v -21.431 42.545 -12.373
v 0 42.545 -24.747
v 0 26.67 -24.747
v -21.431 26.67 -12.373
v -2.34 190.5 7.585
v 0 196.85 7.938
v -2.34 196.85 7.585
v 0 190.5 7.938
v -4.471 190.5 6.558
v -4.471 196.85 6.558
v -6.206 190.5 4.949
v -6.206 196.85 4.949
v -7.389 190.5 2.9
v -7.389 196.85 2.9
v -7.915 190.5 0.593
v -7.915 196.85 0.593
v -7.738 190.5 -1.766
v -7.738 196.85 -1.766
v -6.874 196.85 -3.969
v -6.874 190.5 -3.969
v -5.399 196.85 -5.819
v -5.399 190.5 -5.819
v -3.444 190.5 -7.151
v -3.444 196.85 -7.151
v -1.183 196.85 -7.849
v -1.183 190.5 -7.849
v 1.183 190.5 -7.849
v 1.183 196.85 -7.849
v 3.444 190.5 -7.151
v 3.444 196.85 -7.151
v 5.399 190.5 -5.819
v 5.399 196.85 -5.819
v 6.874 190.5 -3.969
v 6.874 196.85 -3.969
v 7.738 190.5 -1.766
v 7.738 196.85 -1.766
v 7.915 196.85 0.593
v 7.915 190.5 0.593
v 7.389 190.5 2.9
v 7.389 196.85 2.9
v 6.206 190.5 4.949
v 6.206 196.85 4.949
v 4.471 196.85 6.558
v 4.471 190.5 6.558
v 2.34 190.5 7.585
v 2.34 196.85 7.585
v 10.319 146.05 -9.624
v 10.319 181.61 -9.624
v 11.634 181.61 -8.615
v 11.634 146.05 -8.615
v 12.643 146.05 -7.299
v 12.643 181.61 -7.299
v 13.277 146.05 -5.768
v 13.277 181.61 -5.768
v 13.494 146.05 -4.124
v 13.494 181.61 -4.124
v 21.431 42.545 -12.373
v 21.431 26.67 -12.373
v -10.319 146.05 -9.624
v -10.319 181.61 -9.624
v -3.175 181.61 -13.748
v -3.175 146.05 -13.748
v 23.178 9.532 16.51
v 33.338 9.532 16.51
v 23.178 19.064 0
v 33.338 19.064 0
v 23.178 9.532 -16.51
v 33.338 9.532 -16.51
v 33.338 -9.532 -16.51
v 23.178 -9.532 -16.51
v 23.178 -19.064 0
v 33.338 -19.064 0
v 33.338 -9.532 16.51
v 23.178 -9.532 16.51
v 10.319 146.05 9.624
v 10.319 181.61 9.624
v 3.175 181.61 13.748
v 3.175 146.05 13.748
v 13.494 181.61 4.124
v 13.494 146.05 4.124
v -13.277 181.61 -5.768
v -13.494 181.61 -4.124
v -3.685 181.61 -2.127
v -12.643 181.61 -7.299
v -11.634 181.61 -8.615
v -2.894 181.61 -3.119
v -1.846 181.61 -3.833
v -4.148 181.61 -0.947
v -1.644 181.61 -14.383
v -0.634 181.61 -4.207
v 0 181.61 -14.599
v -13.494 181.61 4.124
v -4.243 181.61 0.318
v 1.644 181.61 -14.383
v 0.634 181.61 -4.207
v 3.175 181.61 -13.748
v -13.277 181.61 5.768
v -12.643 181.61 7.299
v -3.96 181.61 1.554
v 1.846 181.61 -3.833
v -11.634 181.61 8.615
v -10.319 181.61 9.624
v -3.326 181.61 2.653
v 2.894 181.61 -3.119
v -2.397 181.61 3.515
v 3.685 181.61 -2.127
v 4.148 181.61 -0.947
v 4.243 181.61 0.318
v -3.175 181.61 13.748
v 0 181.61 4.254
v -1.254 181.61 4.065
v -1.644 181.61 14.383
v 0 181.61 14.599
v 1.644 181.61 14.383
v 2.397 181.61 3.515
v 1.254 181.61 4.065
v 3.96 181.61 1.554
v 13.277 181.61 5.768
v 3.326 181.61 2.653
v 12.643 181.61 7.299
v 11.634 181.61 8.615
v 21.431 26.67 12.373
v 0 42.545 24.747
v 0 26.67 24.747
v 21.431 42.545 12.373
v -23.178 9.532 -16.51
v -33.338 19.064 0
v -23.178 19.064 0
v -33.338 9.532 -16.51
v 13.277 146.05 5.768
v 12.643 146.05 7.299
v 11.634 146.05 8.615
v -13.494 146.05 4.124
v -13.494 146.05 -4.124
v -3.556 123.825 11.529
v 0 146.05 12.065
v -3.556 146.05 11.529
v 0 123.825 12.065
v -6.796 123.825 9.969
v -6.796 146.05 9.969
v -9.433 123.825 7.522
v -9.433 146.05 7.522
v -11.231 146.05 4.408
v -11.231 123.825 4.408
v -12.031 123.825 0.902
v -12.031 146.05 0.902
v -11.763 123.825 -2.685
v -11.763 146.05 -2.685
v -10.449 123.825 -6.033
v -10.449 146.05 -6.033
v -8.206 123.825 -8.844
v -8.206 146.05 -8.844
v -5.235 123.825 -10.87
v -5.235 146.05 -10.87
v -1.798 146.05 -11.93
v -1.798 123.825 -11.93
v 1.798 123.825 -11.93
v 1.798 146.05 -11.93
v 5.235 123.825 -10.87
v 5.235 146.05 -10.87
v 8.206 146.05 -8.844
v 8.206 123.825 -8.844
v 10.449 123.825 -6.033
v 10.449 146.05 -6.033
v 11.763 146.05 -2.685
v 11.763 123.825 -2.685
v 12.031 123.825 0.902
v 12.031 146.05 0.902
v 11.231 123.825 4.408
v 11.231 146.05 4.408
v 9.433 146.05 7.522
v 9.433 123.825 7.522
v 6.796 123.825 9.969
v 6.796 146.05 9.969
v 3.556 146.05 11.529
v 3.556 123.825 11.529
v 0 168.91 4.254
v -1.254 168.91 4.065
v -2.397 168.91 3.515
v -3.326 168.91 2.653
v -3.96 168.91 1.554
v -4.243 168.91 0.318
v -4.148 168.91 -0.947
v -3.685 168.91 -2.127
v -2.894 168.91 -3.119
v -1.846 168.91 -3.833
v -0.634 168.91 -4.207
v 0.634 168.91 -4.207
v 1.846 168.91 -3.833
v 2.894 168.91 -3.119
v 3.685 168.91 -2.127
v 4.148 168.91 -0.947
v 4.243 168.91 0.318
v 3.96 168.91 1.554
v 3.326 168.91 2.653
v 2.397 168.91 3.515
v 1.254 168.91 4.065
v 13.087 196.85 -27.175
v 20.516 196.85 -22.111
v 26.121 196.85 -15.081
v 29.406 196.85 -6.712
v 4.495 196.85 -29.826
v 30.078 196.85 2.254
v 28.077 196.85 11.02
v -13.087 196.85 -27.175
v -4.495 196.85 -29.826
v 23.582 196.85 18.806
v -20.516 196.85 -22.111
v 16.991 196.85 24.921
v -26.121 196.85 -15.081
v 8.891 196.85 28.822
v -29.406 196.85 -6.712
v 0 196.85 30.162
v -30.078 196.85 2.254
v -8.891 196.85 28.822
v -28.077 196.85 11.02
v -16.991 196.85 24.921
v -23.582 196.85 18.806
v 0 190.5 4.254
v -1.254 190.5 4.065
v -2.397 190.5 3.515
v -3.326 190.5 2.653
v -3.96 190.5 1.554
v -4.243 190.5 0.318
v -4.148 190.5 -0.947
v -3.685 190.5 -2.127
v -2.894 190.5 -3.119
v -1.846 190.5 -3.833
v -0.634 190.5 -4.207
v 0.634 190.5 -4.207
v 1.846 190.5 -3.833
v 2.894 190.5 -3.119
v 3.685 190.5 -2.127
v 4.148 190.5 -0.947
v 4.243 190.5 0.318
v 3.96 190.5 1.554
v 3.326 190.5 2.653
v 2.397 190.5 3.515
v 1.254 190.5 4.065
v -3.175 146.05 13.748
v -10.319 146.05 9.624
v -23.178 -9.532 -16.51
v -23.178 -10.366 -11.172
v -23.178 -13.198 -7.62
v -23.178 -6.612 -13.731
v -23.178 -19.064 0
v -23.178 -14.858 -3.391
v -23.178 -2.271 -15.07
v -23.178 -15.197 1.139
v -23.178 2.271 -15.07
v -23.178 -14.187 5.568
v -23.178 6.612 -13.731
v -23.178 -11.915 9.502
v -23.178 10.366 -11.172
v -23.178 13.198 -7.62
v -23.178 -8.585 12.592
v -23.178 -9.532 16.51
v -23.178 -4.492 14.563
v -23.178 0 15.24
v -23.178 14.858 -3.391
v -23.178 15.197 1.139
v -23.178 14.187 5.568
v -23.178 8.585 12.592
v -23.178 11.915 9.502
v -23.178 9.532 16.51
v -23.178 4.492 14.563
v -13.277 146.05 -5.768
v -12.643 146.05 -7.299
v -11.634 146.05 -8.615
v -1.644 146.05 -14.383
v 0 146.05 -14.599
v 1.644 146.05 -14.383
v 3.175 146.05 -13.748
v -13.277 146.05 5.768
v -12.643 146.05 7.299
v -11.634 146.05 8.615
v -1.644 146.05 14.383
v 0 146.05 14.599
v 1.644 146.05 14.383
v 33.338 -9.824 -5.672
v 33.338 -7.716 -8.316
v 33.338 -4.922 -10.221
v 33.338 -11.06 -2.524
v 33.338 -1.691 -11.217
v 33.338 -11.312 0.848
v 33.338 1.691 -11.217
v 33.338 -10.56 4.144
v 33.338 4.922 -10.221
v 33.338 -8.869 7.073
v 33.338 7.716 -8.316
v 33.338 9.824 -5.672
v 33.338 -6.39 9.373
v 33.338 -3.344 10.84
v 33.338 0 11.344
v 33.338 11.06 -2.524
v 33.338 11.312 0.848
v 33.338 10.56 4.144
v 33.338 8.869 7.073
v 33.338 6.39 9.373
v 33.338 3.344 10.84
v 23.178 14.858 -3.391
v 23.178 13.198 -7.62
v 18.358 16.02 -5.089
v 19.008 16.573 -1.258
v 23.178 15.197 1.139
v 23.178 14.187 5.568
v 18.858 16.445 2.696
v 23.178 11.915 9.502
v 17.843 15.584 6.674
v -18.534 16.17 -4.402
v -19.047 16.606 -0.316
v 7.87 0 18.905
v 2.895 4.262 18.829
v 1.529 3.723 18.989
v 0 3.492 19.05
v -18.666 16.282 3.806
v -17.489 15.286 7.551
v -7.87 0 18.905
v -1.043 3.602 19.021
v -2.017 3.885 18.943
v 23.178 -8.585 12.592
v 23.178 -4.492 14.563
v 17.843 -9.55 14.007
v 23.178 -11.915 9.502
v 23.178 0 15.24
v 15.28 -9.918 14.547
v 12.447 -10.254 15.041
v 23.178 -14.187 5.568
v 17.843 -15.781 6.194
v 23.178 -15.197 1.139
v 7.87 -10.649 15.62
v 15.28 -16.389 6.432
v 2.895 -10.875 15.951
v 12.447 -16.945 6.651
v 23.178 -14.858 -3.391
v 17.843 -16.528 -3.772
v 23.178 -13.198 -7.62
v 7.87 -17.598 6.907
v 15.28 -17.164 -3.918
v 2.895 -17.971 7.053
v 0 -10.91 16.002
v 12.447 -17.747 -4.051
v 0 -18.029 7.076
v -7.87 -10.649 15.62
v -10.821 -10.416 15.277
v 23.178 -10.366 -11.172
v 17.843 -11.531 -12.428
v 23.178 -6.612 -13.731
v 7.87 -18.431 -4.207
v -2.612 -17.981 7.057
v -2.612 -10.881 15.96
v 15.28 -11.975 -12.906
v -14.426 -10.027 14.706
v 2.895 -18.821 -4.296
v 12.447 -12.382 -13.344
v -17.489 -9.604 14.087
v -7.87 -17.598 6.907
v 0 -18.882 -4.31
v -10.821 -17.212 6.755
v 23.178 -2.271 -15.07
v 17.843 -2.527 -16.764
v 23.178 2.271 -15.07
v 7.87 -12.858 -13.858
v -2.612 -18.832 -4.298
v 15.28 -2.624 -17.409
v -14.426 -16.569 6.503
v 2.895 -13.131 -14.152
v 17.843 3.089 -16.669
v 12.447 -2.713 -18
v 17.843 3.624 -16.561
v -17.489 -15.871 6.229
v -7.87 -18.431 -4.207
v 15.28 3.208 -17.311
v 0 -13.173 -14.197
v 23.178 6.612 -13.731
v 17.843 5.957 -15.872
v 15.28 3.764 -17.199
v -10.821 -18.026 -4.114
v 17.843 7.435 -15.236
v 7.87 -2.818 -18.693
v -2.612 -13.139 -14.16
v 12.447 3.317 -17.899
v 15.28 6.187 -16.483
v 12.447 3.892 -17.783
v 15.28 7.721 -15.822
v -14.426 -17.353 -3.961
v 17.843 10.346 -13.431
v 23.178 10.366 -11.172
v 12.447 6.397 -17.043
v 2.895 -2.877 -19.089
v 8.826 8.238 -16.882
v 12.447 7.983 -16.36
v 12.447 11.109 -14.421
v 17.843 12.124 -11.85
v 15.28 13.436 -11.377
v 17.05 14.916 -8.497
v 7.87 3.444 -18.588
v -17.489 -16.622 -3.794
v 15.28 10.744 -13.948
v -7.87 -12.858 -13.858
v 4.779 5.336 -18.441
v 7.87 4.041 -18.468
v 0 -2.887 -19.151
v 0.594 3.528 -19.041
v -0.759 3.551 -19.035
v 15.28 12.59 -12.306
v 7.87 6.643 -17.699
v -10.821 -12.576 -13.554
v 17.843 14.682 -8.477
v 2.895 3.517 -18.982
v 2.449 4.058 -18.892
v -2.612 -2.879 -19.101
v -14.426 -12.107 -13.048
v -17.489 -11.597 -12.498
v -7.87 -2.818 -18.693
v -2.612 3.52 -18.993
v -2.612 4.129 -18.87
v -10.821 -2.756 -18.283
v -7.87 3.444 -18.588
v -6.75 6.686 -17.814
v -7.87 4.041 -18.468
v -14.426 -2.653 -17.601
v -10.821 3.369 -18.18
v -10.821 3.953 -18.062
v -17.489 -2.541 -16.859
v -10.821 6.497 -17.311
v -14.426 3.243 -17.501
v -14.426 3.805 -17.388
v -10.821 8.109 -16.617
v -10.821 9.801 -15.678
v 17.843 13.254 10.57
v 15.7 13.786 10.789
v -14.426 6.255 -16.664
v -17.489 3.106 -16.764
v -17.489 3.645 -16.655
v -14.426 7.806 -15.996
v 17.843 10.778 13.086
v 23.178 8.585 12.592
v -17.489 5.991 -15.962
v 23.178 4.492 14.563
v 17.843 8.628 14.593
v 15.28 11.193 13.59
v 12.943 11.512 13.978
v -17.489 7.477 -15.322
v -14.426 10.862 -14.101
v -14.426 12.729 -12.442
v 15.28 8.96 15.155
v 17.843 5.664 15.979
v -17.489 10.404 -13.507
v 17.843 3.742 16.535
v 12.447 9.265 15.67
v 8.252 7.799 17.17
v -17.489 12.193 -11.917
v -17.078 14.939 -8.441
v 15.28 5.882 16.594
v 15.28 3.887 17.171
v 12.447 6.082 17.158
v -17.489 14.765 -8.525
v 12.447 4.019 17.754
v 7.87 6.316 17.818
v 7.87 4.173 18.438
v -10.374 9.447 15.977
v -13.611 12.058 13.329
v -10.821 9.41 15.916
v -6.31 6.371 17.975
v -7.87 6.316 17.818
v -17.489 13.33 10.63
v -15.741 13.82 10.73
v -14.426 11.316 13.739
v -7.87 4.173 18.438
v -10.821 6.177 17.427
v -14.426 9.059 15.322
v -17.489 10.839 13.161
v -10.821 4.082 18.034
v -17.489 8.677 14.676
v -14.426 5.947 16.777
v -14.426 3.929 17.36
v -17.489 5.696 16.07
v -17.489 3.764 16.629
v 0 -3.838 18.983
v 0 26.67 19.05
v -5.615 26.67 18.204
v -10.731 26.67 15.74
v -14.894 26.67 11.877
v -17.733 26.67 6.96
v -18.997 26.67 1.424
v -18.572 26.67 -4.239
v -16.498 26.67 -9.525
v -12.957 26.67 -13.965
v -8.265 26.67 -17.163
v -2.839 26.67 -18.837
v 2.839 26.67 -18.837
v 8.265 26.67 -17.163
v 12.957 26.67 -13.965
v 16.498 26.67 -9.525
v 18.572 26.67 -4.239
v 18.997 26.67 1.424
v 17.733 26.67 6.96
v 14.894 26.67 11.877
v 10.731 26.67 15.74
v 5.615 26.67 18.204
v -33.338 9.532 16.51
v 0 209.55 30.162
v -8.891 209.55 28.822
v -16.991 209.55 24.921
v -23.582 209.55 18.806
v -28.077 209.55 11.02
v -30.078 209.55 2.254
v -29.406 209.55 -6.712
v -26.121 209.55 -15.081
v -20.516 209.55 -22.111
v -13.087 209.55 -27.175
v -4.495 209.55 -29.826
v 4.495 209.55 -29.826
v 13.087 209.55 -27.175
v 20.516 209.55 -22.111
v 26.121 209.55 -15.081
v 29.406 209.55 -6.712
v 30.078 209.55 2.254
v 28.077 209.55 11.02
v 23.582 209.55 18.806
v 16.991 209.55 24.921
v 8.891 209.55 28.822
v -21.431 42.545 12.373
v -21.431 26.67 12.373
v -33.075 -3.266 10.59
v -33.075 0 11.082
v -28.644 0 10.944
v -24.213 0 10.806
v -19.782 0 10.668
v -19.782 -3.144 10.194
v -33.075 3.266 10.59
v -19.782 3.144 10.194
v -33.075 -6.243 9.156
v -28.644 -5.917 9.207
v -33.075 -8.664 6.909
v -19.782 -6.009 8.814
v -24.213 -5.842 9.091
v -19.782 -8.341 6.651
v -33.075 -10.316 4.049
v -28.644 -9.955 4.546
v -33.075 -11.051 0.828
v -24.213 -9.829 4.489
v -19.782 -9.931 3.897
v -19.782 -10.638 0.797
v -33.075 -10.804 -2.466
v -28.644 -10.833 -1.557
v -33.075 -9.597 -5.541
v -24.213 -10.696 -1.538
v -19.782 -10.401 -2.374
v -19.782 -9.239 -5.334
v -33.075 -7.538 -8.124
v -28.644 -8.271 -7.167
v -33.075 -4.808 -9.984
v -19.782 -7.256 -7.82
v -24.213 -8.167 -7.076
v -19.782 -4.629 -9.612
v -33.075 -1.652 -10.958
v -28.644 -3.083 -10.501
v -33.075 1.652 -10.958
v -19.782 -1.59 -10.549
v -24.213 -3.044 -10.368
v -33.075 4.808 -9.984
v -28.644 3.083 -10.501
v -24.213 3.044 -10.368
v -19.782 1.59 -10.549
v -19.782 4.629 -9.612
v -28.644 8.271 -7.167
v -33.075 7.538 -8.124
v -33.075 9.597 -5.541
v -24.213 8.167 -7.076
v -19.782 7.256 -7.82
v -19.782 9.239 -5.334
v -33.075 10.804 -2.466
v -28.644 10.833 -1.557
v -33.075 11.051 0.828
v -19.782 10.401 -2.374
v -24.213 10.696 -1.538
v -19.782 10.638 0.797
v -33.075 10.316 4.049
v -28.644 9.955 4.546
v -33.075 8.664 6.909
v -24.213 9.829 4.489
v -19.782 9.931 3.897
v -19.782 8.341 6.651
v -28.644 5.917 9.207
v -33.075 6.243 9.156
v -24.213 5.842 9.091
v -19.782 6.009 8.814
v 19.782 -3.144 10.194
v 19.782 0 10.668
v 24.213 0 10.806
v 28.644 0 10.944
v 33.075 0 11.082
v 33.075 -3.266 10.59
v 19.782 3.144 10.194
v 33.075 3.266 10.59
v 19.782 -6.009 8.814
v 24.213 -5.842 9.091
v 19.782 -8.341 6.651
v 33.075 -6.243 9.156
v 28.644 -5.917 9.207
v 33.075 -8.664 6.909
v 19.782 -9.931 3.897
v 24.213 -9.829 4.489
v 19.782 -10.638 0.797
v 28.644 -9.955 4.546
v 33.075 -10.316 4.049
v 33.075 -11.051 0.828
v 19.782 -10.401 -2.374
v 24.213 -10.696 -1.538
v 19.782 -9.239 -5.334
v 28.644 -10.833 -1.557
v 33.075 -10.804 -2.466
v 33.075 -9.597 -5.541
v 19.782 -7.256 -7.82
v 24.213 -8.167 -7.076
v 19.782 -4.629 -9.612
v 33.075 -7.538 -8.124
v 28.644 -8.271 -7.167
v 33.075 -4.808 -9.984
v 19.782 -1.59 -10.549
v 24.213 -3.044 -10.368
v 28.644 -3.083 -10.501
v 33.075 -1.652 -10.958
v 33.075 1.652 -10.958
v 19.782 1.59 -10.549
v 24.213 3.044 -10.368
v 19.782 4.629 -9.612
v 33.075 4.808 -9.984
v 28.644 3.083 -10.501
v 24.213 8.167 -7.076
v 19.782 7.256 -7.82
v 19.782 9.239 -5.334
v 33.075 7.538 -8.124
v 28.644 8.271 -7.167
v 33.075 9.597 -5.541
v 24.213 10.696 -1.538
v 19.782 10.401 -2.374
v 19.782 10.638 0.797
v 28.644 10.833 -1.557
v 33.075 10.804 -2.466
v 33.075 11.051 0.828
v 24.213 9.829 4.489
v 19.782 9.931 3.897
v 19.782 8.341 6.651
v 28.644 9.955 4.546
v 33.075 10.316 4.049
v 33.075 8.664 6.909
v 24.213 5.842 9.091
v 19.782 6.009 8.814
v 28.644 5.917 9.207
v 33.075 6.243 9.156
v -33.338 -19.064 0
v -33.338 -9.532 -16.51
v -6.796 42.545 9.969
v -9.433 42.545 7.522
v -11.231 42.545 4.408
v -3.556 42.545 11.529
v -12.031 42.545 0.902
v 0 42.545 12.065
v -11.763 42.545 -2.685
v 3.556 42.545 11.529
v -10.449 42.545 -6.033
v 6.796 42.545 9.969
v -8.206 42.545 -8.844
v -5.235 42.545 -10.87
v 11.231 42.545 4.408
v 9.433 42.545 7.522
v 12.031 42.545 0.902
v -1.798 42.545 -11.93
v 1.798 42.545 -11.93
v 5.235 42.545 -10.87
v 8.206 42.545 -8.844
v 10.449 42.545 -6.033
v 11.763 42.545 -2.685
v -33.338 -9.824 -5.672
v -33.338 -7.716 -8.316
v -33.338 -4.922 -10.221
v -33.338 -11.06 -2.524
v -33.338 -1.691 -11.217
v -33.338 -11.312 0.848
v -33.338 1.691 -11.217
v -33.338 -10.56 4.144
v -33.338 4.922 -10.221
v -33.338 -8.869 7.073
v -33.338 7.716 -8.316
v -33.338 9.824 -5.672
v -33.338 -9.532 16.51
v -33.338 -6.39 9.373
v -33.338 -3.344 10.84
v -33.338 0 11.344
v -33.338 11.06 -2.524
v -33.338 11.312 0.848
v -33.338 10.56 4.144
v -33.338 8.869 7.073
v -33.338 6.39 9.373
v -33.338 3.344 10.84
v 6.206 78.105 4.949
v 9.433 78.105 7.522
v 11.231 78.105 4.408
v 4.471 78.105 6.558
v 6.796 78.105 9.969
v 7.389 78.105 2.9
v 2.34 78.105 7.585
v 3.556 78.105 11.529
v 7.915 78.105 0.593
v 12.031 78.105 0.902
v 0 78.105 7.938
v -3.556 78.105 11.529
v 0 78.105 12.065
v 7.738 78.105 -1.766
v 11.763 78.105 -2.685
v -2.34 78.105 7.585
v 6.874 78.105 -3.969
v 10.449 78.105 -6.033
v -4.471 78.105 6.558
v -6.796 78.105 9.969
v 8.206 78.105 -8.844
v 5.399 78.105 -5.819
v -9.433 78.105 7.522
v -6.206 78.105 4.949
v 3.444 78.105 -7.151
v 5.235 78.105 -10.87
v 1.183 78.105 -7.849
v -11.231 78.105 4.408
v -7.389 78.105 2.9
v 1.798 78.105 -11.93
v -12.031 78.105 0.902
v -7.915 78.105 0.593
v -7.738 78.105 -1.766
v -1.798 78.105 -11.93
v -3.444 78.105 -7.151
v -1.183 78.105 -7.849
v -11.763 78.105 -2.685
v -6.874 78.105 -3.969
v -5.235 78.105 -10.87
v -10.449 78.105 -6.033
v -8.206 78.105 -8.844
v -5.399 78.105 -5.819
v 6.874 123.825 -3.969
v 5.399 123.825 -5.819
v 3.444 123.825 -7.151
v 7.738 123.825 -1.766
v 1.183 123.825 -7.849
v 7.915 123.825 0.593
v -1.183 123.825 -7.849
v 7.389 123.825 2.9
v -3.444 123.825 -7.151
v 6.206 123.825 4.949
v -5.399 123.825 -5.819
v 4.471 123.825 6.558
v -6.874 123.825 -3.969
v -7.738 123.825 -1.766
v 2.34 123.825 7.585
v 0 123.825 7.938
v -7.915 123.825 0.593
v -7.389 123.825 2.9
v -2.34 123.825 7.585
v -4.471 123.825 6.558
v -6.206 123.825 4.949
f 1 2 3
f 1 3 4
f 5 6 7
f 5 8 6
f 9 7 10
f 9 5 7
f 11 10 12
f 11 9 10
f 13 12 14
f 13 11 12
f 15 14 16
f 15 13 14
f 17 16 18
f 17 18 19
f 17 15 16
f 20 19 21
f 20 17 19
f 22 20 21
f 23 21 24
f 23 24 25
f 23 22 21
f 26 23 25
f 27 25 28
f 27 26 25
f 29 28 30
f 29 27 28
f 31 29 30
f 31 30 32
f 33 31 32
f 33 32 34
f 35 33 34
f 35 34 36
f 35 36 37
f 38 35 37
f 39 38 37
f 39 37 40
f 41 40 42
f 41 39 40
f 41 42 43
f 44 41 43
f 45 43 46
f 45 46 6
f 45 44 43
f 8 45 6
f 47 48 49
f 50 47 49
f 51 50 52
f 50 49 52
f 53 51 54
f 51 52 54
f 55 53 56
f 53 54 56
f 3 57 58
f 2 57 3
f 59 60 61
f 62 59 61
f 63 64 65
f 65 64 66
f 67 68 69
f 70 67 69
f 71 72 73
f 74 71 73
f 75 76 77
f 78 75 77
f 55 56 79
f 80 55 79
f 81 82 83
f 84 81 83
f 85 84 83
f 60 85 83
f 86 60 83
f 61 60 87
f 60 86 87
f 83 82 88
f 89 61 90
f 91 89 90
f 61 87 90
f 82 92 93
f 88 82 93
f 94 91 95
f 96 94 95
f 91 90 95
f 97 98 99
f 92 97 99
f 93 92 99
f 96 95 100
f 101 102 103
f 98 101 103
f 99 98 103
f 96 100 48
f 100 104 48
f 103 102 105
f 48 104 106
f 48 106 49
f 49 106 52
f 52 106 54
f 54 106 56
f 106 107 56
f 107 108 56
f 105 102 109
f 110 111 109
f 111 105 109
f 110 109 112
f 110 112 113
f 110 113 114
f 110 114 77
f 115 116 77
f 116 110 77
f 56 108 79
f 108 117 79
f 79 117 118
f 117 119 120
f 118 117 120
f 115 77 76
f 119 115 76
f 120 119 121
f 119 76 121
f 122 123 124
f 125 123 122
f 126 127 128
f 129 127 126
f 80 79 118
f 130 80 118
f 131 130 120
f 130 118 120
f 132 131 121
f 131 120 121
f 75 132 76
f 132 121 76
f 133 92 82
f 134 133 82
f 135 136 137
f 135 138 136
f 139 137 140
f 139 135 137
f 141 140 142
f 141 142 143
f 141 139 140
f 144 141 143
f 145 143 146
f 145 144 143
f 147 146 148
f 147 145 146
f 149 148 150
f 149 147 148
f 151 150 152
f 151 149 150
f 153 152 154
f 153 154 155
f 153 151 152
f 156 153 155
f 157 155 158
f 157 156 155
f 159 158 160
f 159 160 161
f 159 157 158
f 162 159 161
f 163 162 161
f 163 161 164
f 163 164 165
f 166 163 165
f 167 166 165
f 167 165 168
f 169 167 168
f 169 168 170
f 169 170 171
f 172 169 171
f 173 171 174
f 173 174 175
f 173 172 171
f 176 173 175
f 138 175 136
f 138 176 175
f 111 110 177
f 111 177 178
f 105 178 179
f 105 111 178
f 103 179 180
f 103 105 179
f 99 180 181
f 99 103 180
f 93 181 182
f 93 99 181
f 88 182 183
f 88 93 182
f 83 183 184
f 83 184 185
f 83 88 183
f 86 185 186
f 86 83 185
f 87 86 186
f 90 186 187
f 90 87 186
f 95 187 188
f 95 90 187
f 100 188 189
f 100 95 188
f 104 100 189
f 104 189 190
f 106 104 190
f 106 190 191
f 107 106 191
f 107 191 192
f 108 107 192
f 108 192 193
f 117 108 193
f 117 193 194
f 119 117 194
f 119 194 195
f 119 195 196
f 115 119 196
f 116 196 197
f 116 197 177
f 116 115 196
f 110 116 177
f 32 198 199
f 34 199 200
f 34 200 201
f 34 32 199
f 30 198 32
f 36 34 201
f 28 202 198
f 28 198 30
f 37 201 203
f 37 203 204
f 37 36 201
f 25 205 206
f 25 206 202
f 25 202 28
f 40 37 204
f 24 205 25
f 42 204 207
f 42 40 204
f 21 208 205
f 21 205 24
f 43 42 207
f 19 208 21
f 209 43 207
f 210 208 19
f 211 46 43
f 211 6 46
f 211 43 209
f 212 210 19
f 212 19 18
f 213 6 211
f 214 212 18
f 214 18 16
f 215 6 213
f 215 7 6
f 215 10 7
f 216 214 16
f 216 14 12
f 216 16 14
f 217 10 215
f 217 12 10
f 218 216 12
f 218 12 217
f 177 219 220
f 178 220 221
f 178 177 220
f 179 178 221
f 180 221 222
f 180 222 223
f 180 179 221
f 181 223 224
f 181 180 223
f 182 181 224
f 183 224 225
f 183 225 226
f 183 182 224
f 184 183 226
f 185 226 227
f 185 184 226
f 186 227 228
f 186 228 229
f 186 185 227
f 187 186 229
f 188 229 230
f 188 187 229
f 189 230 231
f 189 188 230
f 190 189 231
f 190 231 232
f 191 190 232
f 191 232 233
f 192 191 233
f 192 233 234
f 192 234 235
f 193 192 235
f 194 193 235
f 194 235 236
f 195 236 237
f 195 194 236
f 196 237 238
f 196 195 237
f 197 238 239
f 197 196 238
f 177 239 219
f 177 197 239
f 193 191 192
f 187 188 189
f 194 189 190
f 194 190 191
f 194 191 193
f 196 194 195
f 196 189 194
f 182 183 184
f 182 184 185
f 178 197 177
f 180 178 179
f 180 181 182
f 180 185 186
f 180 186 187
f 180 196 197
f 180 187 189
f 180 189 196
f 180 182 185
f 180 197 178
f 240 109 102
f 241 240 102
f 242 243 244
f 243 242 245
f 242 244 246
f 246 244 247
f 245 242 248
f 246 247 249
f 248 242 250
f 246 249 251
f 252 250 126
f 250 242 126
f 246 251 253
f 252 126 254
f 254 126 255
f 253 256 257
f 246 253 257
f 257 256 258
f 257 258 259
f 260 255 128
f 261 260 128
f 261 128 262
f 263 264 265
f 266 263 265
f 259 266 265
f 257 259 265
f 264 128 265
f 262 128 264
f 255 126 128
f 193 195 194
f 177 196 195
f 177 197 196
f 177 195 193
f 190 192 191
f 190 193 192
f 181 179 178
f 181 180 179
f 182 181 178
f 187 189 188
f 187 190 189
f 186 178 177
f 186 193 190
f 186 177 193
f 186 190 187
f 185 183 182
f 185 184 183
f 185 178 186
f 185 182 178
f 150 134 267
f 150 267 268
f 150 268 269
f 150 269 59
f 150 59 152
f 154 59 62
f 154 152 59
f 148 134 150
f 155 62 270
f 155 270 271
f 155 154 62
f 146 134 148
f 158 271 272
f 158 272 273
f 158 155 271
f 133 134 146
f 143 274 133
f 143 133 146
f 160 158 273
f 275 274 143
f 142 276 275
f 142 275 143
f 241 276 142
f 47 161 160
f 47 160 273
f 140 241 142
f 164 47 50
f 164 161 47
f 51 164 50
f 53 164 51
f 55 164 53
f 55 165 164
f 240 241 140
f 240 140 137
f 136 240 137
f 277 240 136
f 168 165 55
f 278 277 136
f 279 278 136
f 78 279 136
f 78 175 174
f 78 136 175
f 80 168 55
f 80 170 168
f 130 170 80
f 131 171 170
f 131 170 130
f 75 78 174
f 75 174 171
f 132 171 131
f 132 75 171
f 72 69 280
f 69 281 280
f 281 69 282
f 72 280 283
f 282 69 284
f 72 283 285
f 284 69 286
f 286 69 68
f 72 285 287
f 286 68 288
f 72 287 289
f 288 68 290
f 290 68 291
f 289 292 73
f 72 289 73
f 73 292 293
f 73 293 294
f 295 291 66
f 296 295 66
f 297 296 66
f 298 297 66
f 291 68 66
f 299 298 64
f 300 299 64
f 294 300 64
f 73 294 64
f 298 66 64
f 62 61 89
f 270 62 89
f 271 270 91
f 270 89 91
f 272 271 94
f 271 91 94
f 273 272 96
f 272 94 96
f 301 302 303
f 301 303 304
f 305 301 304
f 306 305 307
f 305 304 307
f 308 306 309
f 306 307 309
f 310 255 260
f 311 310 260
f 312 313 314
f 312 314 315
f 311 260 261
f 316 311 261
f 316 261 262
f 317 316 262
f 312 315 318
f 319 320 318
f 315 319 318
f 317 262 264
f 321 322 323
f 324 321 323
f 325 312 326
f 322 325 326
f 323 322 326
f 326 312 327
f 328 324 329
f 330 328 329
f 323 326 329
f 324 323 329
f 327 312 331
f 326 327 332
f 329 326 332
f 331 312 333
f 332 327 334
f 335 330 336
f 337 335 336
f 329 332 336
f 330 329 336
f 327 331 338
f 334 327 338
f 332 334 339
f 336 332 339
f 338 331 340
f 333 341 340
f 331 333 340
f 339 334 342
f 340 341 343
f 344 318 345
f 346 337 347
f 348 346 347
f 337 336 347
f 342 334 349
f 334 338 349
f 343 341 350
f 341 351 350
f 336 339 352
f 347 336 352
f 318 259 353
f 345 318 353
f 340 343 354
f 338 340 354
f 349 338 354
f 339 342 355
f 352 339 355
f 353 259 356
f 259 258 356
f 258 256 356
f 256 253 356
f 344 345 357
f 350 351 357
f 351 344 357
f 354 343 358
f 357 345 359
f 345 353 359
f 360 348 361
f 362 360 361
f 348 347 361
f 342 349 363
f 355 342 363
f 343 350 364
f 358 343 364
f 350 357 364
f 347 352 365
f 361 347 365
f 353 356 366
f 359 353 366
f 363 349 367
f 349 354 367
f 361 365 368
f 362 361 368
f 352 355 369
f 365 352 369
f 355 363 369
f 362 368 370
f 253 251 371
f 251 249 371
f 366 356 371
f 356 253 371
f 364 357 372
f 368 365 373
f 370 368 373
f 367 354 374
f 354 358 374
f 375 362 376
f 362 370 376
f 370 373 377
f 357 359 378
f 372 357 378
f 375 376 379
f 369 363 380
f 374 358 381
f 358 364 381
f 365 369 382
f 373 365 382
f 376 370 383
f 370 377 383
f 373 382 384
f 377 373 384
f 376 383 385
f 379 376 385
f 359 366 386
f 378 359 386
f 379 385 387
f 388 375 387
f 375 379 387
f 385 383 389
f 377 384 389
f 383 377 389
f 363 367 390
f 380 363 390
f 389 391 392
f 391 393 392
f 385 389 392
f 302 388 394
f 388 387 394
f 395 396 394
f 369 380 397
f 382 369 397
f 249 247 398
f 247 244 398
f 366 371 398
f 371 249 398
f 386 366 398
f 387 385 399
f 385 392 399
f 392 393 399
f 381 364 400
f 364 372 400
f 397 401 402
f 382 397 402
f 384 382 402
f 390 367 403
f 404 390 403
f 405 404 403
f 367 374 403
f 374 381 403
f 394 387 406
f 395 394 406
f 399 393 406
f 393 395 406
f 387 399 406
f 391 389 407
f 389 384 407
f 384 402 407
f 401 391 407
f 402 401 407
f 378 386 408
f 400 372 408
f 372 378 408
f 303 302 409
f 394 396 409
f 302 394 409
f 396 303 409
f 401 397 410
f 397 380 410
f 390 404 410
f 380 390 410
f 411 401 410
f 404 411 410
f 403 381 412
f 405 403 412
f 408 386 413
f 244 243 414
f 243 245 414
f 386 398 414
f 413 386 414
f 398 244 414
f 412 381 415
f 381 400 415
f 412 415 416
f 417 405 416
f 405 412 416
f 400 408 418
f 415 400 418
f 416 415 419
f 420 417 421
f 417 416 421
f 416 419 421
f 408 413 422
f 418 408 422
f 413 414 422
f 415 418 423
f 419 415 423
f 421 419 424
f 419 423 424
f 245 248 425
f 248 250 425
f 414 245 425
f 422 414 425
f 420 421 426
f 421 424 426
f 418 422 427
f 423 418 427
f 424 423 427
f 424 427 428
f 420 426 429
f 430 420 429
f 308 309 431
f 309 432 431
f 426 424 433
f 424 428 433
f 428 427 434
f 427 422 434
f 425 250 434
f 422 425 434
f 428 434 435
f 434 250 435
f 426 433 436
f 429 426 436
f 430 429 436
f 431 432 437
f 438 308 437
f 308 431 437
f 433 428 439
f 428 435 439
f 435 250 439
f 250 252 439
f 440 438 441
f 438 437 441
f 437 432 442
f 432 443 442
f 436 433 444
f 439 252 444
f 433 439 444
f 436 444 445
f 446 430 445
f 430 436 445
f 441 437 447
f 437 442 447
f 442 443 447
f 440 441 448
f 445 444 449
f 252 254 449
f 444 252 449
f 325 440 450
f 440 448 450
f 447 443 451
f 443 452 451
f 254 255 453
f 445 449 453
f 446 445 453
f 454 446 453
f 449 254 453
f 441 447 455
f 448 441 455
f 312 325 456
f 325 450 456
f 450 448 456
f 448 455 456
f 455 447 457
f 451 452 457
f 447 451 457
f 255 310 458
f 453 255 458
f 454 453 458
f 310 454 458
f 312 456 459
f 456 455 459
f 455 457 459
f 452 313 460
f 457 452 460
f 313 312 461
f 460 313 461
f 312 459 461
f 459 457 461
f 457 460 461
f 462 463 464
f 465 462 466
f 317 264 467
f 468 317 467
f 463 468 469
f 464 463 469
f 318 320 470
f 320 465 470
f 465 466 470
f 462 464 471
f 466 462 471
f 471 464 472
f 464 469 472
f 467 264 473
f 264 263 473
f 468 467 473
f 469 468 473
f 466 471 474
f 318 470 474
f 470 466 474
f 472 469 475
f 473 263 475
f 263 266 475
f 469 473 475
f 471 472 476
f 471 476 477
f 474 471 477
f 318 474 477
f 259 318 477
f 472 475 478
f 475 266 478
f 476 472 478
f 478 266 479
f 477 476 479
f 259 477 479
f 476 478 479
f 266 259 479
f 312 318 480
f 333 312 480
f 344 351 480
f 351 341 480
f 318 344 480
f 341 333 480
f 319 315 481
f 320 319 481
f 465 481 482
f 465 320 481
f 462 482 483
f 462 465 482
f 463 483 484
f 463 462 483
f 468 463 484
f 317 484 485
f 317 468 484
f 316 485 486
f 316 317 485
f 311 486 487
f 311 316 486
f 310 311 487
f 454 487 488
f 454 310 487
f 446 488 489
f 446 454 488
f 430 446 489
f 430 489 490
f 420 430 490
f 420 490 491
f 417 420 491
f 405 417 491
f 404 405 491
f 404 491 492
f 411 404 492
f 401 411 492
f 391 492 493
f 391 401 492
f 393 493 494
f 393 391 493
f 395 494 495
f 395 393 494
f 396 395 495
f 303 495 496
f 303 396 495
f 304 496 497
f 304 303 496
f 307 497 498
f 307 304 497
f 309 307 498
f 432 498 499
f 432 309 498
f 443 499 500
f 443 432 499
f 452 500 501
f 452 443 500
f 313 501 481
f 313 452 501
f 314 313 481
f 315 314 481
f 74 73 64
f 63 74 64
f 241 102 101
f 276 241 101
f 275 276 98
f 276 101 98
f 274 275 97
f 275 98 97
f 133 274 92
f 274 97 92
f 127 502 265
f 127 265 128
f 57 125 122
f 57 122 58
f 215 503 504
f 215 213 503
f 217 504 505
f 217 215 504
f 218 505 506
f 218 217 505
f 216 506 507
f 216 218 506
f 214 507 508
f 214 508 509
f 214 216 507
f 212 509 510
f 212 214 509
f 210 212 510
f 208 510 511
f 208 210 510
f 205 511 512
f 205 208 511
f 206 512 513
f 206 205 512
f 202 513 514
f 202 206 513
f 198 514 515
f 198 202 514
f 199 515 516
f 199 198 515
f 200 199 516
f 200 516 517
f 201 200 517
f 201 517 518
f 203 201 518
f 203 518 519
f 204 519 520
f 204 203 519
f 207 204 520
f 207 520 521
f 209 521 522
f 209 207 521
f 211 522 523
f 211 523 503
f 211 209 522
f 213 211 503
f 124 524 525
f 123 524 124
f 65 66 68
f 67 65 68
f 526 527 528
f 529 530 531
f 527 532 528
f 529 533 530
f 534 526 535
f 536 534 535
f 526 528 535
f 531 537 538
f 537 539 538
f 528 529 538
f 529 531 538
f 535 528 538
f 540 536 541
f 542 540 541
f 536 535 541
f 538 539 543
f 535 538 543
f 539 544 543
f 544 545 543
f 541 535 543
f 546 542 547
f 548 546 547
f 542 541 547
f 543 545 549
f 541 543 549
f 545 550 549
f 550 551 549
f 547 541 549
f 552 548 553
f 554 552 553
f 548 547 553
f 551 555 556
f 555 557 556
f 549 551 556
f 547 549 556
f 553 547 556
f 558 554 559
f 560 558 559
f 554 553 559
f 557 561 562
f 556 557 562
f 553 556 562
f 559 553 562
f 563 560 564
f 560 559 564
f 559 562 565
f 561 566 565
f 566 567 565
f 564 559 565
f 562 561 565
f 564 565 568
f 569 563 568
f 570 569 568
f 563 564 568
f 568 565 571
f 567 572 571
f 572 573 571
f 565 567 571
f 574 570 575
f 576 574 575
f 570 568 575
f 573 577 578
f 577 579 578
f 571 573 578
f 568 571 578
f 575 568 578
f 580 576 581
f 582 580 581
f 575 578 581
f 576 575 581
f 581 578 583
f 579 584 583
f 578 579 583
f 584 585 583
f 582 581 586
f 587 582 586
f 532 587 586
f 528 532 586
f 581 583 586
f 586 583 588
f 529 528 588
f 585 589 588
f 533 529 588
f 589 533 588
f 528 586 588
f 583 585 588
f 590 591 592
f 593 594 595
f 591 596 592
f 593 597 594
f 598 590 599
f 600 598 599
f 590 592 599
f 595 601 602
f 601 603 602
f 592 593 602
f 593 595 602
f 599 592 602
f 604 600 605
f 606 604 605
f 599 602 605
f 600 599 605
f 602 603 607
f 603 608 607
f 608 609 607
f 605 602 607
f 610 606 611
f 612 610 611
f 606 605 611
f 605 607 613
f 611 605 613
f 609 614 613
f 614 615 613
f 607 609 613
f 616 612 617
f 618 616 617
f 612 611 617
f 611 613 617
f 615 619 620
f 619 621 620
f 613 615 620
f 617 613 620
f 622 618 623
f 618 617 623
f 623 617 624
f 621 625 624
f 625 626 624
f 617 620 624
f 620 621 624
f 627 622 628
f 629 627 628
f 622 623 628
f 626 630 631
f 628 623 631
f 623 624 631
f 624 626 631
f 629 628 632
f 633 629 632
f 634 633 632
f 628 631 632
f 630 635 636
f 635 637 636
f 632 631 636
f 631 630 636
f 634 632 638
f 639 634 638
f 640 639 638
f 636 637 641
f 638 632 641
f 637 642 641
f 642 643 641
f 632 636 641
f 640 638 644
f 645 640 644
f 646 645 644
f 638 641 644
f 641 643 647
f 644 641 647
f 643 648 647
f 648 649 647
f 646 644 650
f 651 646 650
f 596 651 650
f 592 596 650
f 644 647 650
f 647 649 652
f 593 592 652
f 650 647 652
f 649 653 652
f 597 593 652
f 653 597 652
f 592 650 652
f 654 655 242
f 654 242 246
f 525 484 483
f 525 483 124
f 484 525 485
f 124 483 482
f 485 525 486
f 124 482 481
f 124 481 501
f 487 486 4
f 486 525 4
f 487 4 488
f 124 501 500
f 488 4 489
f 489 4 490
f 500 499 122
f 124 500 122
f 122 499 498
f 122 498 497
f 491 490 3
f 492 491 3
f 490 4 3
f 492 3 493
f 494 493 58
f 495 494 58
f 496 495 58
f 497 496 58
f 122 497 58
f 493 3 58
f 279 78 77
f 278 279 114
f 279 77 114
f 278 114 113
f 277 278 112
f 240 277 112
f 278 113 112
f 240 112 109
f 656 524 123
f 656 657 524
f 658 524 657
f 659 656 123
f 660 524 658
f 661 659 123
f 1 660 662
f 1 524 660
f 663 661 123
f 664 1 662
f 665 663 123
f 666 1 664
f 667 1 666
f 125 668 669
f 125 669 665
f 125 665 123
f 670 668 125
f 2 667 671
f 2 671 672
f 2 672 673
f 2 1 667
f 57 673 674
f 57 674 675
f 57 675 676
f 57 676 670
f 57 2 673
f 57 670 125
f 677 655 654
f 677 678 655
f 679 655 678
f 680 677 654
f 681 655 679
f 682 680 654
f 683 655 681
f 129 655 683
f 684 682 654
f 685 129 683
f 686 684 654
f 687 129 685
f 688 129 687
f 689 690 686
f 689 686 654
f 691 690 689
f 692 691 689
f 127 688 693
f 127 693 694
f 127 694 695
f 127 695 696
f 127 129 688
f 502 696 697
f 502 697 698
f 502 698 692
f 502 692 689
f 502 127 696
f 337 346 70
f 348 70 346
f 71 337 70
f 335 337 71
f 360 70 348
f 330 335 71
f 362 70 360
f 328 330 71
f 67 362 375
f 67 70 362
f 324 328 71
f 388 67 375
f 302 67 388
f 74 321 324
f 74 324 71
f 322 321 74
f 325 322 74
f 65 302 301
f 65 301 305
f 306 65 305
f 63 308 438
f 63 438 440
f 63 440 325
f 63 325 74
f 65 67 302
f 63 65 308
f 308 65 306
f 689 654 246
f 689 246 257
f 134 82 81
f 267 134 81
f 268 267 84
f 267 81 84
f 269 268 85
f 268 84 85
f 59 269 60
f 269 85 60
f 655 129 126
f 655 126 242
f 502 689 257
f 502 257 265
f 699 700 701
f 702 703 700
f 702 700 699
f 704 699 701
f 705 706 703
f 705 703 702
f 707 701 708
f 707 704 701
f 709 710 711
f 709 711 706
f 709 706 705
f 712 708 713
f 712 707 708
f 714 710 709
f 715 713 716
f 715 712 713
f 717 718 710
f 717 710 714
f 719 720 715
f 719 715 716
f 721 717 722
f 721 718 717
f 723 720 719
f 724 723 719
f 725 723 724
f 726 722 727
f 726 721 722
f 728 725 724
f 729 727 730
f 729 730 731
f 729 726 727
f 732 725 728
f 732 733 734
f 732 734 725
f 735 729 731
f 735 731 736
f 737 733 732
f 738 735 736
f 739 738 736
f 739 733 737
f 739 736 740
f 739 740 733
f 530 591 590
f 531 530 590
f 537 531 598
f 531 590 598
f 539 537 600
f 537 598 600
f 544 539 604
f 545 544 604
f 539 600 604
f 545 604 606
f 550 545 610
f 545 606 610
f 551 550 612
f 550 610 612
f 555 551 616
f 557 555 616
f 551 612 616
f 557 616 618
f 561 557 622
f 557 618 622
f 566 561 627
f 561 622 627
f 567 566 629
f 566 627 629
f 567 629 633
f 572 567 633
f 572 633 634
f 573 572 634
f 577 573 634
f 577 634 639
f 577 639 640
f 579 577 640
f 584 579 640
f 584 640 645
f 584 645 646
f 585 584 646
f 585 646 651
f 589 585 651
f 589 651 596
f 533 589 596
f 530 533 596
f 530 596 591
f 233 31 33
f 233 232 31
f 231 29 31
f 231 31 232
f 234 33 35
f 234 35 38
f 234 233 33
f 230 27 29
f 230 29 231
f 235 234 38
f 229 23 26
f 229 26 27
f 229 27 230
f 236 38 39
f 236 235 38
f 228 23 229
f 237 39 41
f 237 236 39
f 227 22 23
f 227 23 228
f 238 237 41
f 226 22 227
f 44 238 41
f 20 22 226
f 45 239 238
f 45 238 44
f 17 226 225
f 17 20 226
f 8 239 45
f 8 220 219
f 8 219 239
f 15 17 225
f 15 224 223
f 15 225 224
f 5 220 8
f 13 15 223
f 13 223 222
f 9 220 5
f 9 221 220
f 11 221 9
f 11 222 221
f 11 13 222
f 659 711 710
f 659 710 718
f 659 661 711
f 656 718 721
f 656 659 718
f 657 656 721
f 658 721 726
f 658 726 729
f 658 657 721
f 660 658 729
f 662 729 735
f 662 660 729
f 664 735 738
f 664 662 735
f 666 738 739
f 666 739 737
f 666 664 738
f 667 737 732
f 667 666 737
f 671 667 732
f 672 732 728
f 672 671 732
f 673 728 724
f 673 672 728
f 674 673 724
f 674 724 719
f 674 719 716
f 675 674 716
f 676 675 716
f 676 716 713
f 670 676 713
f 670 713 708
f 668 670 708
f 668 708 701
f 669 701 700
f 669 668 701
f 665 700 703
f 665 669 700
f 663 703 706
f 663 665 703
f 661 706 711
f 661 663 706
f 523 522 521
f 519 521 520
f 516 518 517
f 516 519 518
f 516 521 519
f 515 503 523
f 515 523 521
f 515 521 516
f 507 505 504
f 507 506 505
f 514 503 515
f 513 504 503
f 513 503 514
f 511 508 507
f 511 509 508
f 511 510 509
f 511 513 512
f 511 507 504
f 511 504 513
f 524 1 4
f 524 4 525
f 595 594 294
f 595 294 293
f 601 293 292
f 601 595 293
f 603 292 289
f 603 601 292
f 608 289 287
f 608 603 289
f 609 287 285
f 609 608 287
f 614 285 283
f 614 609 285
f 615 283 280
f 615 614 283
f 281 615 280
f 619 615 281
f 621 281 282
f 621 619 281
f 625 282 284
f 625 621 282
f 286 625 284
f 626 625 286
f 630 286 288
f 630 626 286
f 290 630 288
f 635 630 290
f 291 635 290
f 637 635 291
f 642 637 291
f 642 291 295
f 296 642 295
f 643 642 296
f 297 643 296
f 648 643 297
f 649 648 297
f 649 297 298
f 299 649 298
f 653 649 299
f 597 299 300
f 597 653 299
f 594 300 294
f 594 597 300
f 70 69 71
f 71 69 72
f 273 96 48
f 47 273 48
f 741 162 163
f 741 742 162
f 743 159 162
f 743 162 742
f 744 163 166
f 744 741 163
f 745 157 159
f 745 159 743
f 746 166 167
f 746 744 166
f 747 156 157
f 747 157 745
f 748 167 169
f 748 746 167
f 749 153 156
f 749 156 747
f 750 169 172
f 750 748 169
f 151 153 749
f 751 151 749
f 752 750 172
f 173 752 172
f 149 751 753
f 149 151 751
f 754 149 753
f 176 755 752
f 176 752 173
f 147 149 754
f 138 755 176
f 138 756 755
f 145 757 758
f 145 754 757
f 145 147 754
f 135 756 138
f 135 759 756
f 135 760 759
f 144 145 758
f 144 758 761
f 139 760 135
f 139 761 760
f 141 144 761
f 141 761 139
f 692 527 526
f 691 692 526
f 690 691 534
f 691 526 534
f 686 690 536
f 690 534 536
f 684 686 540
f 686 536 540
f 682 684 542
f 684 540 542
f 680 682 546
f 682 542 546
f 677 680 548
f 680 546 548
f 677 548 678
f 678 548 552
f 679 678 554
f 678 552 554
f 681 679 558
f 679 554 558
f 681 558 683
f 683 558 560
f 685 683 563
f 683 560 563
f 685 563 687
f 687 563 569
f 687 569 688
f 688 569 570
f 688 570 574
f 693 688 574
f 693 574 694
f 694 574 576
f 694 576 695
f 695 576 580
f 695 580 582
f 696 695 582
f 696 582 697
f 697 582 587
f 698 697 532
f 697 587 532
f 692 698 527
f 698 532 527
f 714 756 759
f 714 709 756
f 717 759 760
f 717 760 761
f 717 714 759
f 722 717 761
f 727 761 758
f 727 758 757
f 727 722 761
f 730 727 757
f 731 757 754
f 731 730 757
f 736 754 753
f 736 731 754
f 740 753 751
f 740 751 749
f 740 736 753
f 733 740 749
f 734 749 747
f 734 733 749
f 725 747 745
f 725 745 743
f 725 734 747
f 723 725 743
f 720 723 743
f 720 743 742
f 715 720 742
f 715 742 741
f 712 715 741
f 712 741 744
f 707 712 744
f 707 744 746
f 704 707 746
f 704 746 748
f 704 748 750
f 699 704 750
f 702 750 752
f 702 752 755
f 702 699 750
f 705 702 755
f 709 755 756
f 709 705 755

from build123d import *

# Parameters (mm, degrees)
CUT_EXTRUDE1_DEPTH      = 186.884048489
CUT_EXTRUDE1_DEPTH_BACK = 186.884048489
SKETCH3_R               = 10.668
SKETCH4_R               = 11.0900667
BOSS_EXTRUDE1_DEPTH     = 10.16
BOSS_EXTRUDE2_DEPTH     = 15.875
SKETCH9_R               = 4.2545
BOSS_EXTRUDE4_DEPTH     = 35.56


with BuildPart() as part:
    # Sketch1 → Revolve1 (revolve)
    with BuildSketch(Plane.XY, mode=Mode.PRIVATE) as revolve1_sk:
        with BuildLine():
            Line((-33.3375, 11.0900667), (-19.78152, 10.668))
            Line((-19.78152, 10.668), (19.78152, 10.668))
            Line((19.78152, 10.668), (33.3375, 11.0900667))
            Line((33.3375, 11.0900667), (33.3375, 16.51))
            Line((33.3375, 16.51), (23.1775, 16.51))
            Line((23.1775, 16.51), (23.1775, 15.24))
            ThreePointArc((23.1775, 15.24), (0, 19.3675), (-23.1775, 15.24))
            Line((-23.1775, 15.24), (-23.1775, 16.51))
            Line((-23.1775, 16.51), (-33.3375, 16.51))
            Line((-33.3375, 16.51), (-33.3375, 11.0900667))
        make_face()
    revolve(revolve1_sk.sketch.rotate(Axis((-33.3375, 0, 0), (1, 0, 0)), 90), axis=Axis((-33.3375, 0, 0), (1, 0, 0)))

    # Sketch2 → Revolve2 (revolve)
    with BuildSketch(Plane.XY, mode=Mode.PRIVATE) as revolve2_sk:
        Polygon((0, 0), (0, 168.91), (4.2545, 168.91), (4.2545, 181.61), (13.49375, 181.61), (13.49375, 146.05), (12.065, 146.05), (12.065, 123.825), (7.9375, 123.825), (7.9375, 78.105), (12.065, 78.105), (12.065, 42.545), (21.43125, 42.545), (21.43125, 26.67), (19.05, 26.67), (19.05, 0), align=None)
    revolve(revolve2_sk.sketch.rotate(Axis((0, 0, 0), (0, -1, 0)), 90), axis=Axis((0, 0, 0), (0, -1, 0)))

    # Sketch3 → Cut-Extrude1 (cut, two sides: drawn at the far end of the back side and taken through both)
    with BuildSketch(Plane(origin=(0, 0, 0), x_dir=(0, 0, -1), z_dir=(1, 0, 0)).offset(-CUT_EXTRUDE1_DEPTH_BACK)):
        with Locations(Location((0, 0, 0), (0, 0, 180))):
            Circle(SKETCH3_R)
    extrude(amount=CUT_EXTRUDE1_DEPTH + CUT_EXTRUDE1_DEPTH_BACK, mode=Mode.SUBTRACT)

    # Sketch4 → Boss-Extrude1 (add)
    with BuildSketch(Plane.ZY.offset(33.3375)):
        Polygon((0, 19.064105889), (-16.51, 9.532052944), (-16.51, -9.532052944), (0, -19.064105889), (16.51, -9.532052944), (16.51, 9.532052944), align=None)
        Circle(SKETCH4_R, mode=Mode.SUBTRACT)
    boss_extrude1 = extrude(amount=-BOSS_EXTRUDE1_DEPTH)

    # Cut-Extrude3 cone 1 section (through the dimple's axis) → Cut-Extrude3 (revolve, cut)
    with BuildSketch(Plane(origin=(-33.3375, 0, 0), x_dir=(0, 0, 1), z_dir=(0, 1, 0))):
        Polygon((0, 0), (11.3440667, 0), (0, 11.3440667), align=None)
    cut_extrude3 = revolve(axis=Axis((-33.3375, 0, 0), (1, 0, 0)), mode=Mode.SUBTRACT)

    # Mirror1: Boss-Extrude1, Cut-Extrude3 across plane
    add(boss_extrude1.mirror(Plane(origin=(0, 0, 0), x_dir=(0, 0, 1), z_dir=(1, 0, 0))))
    add(cut_extrude3.mirror(Plane(origin=(0, 0, 0), x_dir=(0, 0, 1), z_dir=(1, 0, 0))), mode=Mode.SUBTRACT)

    # Sketch8 → Boss-Extrude2 (add)
    with BuildSketch(Plane(origin=(0, 42.545, 0), x_dir=(1, 0, 0), z_dir=(0, 1, 0))):
        Polygon((0, -24.746675913), (21.43125, -12.373337957), (21.43125, 12.373337957), (0, 24.746675913), (-21.43125, 12.373337957), (-21.43125, -12.373337957), align=None)
    extrude(amount=-BOSS_EXTRUDE2_DEPTH)

    # Sketch9 → Boss-Extrude4 (add)
    with BuildSketch(Plane(origin=(0, 181.61, -183.515), x_dir=(1, 0, 0), z_dir=(0, -1, 0))):
        with BuildLine():
            Line((-3.175, 197.263153285), (-10.31875, 193.1387073))
            ThreePointArc((-10.31875, 193.1387073), (-12.643011314, 190.814445986), (-13.49375, 187.639445986))
            Line((-13.49375, 187.639445986), (-13.49375, 179.390554014))
            ThreePointArc((-13.49375, 179.390554014), (-12.643011314, 176.215554014), (-10.31875, 173.8912927))
            Line((-10.31875, 173.8912927), (-3.175, 169.766846715))
            ThreePointArc((-3.175, 169.766846715), (0, 168.916108029), (3.175, 169.766846715))
            Line((3.175, 169.766846715), (10.31875, 173.8912927))
            ThreePointArc((10.31875, 173.8912927), (12.643011314, 176.215554014), (13.49375, 179.390554014))
            Line((13.49375, 179.390554014), (13.49375, 187.639445986))
            ThreePointArc((13.49375, 187.639445986), (12.643011314, 190.814445986), (10.31875, 193.1387073))
            Line((10.31875, 193.1387073), (3.175, 197.263153285))
            ThreePointArc((3.175, 197.263153285), (0, 198.113891971), (-3.175, 197.263153285))
        make_face()
        with Locations(Location((0, 183.515, 0), (0, 0, 90))):
            Circle(SKETCH9_R, mode=Mode.SUBTRACT)
    extrude(amount=BOSS_EXTRUDE4_DEPTH)


with BuildPart() as body_2:
    # Sketch11 → Revolve4 (revolve)
    with BuildSketch(Plane.XY, mode=Mode.PRIVATE) as revolve4_sk:
        Polygon((0, 168.91), (0, 209.55), (-30.1625, 209.55), (-30.1625, 196.85), (-7.9375, 196.85), (-7.9375, 190.5), (-4.2545, 190.5), (-4.2545, 168.91), align=None)
    revolve(revolve4_sk.sketch.rotate(Axis((0, 168.91, 0), (0, -1, 0)), 270), axis=Axis((0, 168.91, 0), (0, -1, 0)))


solid = Compound([part.part, body_2.part])
